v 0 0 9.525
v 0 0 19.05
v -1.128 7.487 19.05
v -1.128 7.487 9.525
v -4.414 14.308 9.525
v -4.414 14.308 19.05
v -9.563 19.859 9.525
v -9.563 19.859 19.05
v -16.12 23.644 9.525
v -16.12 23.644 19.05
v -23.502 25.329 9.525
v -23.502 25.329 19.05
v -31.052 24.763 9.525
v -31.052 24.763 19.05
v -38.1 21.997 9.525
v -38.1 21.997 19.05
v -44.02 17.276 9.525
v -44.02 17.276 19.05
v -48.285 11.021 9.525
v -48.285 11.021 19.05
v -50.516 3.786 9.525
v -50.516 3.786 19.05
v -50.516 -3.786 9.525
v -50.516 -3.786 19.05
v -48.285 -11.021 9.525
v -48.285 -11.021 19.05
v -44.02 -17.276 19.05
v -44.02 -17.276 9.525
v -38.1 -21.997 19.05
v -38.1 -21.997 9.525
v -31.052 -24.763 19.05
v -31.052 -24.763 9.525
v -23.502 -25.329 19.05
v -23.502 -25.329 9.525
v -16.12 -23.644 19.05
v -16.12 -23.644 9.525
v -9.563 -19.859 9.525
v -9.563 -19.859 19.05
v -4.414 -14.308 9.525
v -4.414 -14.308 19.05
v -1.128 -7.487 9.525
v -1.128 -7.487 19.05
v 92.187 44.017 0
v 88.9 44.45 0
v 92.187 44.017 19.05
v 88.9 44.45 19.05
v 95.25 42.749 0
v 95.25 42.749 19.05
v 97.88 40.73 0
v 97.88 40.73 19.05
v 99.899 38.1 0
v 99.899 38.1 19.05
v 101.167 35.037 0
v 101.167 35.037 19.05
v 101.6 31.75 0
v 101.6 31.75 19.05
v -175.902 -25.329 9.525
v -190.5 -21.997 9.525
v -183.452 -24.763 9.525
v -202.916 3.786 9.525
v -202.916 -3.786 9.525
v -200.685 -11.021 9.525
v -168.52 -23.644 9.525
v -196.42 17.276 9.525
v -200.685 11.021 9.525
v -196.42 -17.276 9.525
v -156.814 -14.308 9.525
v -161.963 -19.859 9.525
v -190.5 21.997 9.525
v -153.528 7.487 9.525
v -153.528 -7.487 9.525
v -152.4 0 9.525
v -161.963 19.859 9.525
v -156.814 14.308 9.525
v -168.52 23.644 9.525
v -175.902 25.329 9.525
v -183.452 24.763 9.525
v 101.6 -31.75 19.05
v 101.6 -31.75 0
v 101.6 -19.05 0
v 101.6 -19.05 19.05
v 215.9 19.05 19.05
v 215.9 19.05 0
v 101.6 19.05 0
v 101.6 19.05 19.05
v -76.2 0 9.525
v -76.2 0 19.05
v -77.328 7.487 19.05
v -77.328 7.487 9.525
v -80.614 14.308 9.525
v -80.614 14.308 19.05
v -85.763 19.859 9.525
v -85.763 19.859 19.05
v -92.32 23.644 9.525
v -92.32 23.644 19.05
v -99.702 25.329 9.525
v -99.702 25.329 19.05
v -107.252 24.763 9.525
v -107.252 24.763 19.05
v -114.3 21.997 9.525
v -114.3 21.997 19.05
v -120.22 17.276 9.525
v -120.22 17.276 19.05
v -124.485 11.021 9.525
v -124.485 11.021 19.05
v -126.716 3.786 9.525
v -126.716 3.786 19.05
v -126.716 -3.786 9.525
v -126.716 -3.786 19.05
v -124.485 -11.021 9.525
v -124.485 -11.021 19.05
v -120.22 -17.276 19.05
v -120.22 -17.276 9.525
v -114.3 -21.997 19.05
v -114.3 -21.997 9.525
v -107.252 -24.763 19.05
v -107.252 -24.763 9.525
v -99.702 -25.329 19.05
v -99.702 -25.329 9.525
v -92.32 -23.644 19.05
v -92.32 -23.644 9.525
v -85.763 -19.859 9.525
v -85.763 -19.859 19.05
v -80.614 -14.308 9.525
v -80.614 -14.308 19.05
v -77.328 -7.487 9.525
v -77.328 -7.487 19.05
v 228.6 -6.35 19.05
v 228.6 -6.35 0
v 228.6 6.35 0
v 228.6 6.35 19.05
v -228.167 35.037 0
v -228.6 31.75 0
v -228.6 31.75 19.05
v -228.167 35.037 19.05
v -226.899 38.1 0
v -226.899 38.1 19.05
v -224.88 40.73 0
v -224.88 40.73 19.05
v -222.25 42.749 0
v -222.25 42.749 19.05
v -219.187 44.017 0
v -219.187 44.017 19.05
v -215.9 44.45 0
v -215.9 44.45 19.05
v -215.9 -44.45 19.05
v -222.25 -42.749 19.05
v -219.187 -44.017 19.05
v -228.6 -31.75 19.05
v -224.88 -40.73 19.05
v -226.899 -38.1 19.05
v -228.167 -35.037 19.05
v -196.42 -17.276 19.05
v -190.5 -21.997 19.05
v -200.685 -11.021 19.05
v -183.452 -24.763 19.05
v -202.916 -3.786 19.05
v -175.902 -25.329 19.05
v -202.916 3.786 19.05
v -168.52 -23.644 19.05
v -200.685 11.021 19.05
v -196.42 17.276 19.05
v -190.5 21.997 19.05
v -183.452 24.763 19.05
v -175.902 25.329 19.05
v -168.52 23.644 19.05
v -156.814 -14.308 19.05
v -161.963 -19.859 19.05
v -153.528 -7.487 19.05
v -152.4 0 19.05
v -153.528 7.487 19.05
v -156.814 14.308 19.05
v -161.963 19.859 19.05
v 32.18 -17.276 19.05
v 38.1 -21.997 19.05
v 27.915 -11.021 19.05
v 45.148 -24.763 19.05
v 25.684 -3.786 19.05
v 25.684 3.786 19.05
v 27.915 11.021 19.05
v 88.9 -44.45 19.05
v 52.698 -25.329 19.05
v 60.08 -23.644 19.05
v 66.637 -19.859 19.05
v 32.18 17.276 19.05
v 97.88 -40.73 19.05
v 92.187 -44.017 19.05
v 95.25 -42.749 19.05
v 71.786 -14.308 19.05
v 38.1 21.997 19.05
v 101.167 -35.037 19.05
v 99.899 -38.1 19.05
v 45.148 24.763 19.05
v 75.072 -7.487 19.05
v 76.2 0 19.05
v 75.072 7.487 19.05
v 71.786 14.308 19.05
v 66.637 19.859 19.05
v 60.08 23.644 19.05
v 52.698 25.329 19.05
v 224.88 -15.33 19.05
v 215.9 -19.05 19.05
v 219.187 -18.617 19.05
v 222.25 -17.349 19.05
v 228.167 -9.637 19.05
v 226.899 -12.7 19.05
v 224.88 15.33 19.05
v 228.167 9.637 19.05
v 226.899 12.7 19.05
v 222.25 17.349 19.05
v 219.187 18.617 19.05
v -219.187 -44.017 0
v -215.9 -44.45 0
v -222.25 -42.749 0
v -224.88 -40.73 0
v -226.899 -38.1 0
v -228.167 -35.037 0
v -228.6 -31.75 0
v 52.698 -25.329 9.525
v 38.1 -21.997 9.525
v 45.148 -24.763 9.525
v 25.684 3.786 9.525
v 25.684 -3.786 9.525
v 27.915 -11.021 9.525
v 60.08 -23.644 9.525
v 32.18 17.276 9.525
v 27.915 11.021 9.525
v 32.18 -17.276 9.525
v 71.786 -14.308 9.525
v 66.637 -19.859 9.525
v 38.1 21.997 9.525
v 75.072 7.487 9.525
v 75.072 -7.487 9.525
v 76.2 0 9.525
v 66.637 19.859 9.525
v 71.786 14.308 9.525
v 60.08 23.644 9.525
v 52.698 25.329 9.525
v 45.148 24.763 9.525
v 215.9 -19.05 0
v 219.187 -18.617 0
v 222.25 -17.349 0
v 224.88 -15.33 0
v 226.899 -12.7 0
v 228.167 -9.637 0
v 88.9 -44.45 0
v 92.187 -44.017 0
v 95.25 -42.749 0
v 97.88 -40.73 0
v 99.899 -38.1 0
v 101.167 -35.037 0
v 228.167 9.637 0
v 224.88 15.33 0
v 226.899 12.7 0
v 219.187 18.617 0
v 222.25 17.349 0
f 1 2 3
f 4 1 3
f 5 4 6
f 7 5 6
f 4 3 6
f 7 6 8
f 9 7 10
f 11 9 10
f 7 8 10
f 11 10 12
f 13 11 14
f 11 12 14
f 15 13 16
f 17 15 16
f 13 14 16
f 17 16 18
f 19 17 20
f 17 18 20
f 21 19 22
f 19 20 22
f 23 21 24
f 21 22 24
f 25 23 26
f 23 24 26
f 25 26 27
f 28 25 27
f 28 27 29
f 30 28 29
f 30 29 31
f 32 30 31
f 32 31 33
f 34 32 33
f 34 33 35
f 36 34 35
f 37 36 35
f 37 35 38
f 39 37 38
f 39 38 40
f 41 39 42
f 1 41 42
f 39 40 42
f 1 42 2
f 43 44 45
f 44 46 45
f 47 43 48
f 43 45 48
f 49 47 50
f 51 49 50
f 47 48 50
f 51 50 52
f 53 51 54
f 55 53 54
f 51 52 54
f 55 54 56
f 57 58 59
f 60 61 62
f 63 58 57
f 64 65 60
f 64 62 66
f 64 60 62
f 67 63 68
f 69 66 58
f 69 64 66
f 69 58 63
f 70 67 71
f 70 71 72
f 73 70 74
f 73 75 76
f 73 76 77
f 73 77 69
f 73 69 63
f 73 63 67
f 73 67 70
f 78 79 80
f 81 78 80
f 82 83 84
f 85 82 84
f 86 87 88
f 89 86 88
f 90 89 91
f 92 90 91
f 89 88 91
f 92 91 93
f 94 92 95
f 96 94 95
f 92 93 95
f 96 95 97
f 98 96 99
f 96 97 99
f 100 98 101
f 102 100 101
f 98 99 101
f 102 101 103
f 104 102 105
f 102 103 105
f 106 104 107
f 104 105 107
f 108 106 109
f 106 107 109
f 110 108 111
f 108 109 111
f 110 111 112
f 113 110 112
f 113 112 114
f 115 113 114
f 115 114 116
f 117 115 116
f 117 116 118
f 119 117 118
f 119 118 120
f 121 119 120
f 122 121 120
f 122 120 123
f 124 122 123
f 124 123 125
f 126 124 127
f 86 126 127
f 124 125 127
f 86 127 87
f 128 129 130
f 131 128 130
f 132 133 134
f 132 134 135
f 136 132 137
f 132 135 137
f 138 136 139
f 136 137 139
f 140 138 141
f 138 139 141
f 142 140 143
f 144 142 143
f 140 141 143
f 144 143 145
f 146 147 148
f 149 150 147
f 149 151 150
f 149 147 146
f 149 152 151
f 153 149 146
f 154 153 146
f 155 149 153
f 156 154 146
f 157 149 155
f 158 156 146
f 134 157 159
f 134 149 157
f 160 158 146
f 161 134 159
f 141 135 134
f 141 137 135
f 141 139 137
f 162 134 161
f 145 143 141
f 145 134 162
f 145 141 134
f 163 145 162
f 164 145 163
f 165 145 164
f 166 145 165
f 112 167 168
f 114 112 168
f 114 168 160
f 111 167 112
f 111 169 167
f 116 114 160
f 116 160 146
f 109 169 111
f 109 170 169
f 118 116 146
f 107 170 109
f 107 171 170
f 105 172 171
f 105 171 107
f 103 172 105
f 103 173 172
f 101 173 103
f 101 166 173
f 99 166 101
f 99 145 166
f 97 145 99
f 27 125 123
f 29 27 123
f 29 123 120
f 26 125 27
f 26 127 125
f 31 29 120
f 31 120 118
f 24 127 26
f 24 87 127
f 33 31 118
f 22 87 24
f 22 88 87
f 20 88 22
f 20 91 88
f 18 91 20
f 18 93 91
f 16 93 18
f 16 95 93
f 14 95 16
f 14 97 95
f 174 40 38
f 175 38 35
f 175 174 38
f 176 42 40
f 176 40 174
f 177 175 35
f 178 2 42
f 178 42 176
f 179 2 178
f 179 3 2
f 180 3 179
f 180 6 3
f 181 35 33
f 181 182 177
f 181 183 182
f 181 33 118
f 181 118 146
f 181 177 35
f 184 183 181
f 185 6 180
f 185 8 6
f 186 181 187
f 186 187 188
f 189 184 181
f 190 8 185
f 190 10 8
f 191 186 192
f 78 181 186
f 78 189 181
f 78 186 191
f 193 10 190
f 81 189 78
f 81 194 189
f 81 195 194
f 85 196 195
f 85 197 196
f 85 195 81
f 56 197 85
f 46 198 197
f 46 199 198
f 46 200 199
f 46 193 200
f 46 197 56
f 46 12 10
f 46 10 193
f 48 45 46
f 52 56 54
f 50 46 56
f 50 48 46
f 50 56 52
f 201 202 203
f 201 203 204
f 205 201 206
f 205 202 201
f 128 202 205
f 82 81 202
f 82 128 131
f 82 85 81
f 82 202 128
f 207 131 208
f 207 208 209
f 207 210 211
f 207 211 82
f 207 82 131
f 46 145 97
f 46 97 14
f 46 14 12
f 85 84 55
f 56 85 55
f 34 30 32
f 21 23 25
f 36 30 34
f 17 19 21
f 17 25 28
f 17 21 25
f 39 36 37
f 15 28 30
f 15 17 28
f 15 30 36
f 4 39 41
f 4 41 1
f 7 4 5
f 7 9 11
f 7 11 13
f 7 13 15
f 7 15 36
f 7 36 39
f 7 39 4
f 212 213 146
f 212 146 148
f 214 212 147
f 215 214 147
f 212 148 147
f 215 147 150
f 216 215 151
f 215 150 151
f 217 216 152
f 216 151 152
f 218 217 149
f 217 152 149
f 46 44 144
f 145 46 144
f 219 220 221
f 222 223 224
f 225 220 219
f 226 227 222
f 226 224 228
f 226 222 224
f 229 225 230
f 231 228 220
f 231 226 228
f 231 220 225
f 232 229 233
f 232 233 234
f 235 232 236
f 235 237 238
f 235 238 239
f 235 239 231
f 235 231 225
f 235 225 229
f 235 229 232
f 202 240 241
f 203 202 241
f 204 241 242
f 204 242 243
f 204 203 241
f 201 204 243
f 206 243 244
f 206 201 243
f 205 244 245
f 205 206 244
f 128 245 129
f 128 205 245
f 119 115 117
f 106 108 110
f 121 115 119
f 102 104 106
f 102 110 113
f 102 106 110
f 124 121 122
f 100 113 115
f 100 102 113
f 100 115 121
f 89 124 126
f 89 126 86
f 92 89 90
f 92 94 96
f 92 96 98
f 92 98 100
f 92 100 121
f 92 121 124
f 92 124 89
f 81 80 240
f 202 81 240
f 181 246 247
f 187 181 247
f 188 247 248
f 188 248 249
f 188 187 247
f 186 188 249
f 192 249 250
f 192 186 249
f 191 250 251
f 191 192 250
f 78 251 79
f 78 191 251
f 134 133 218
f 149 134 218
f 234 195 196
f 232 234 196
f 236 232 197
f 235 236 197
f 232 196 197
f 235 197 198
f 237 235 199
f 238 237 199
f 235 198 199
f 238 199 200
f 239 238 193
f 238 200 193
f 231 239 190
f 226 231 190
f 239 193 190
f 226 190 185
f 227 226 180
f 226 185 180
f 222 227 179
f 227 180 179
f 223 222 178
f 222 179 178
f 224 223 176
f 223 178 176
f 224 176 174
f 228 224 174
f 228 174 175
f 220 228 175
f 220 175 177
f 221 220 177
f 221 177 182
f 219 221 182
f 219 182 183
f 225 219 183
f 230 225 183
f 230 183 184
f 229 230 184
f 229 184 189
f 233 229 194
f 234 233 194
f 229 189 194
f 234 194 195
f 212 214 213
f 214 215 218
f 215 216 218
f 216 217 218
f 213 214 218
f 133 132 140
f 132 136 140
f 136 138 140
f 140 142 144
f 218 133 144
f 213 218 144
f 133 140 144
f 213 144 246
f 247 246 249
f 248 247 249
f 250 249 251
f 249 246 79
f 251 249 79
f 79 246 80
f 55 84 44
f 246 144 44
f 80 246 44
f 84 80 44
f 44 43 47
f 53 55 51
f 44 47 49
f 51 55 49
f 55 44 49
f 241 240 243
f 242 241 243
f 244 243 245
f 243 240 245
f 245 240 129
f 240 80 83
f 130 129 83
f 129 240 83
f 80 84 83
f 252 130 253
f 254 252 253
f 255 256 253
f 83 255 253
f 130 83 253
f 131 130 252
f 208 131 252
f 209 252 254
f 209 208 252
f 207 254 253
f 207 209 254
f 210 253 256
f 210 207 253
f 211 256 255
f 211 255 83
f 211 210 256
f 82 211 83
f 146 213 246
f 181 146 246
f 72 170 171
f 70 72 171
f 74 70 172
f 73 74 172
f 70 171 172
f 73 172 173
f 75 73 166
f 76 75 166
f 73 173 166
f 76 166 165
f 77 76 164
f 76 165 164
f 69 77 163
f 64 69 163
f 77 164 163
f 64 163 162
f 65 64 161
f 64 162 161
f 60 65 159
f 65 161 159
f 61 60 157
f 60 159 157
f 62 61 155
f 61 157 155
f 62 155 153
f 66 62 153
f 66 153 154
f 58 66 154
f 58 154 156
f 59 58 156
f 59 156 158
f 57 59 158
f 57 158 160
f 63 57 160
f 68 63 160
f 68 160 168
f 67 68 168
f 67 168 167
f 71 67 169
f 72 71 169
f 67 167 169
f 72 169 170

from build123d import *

# Parameters (mm, degrees)
F1_DEPTH = 19.05
F2_R     = 25.4
F3_DEPTH = 9.525
F4_R     = 12.7


with BuildPart() as f1:
    # F0 (on Top) → F1 (new body)
    with BuildSketch(Plane.XY):
        Polygon((-228.6, -44.45), (101.6, -44.45), (101.6, -19.05), (228.6, -19.05), (228.6, 19.05), (101.6, 19.05), (101.6, 44.45), (-228.6, 44.45), align=None)
    extrude(amount=F1_DEPTH)

    # F2 (on face) → F3 (cut)
    with BuildSketch(Plane.XY.offset(19.05)):
        with Locations((-177.8, 0)):
            Circle(F2_R)
        with Locations((-101.6, 0)):
            Circle(F2_R)
        with Locations((-25.4, 0)):
            Circle(F2_R)
        with Locations((50.8, 0)):
            Circle(F2_R)
    extrude(amount=-F3_DEPTH, mode=Mode.SUBTRACT)

    # F4
    f4_edges = [f1.edges().sort_by_distance(p)[0] for p in [
        (-228.6, -44.45, 9.525),
        (101.6, -44.45, 9.525),
        (101.6, 44.45, 9.525),
        (228.6, -19.05, 9.525),
        (228.6, 19.05, 9.525),
        (-228.6, 44.45, 9.525),
    ]]
    fillet(f4_edges, radius=F4_R)


solid = f1.part
